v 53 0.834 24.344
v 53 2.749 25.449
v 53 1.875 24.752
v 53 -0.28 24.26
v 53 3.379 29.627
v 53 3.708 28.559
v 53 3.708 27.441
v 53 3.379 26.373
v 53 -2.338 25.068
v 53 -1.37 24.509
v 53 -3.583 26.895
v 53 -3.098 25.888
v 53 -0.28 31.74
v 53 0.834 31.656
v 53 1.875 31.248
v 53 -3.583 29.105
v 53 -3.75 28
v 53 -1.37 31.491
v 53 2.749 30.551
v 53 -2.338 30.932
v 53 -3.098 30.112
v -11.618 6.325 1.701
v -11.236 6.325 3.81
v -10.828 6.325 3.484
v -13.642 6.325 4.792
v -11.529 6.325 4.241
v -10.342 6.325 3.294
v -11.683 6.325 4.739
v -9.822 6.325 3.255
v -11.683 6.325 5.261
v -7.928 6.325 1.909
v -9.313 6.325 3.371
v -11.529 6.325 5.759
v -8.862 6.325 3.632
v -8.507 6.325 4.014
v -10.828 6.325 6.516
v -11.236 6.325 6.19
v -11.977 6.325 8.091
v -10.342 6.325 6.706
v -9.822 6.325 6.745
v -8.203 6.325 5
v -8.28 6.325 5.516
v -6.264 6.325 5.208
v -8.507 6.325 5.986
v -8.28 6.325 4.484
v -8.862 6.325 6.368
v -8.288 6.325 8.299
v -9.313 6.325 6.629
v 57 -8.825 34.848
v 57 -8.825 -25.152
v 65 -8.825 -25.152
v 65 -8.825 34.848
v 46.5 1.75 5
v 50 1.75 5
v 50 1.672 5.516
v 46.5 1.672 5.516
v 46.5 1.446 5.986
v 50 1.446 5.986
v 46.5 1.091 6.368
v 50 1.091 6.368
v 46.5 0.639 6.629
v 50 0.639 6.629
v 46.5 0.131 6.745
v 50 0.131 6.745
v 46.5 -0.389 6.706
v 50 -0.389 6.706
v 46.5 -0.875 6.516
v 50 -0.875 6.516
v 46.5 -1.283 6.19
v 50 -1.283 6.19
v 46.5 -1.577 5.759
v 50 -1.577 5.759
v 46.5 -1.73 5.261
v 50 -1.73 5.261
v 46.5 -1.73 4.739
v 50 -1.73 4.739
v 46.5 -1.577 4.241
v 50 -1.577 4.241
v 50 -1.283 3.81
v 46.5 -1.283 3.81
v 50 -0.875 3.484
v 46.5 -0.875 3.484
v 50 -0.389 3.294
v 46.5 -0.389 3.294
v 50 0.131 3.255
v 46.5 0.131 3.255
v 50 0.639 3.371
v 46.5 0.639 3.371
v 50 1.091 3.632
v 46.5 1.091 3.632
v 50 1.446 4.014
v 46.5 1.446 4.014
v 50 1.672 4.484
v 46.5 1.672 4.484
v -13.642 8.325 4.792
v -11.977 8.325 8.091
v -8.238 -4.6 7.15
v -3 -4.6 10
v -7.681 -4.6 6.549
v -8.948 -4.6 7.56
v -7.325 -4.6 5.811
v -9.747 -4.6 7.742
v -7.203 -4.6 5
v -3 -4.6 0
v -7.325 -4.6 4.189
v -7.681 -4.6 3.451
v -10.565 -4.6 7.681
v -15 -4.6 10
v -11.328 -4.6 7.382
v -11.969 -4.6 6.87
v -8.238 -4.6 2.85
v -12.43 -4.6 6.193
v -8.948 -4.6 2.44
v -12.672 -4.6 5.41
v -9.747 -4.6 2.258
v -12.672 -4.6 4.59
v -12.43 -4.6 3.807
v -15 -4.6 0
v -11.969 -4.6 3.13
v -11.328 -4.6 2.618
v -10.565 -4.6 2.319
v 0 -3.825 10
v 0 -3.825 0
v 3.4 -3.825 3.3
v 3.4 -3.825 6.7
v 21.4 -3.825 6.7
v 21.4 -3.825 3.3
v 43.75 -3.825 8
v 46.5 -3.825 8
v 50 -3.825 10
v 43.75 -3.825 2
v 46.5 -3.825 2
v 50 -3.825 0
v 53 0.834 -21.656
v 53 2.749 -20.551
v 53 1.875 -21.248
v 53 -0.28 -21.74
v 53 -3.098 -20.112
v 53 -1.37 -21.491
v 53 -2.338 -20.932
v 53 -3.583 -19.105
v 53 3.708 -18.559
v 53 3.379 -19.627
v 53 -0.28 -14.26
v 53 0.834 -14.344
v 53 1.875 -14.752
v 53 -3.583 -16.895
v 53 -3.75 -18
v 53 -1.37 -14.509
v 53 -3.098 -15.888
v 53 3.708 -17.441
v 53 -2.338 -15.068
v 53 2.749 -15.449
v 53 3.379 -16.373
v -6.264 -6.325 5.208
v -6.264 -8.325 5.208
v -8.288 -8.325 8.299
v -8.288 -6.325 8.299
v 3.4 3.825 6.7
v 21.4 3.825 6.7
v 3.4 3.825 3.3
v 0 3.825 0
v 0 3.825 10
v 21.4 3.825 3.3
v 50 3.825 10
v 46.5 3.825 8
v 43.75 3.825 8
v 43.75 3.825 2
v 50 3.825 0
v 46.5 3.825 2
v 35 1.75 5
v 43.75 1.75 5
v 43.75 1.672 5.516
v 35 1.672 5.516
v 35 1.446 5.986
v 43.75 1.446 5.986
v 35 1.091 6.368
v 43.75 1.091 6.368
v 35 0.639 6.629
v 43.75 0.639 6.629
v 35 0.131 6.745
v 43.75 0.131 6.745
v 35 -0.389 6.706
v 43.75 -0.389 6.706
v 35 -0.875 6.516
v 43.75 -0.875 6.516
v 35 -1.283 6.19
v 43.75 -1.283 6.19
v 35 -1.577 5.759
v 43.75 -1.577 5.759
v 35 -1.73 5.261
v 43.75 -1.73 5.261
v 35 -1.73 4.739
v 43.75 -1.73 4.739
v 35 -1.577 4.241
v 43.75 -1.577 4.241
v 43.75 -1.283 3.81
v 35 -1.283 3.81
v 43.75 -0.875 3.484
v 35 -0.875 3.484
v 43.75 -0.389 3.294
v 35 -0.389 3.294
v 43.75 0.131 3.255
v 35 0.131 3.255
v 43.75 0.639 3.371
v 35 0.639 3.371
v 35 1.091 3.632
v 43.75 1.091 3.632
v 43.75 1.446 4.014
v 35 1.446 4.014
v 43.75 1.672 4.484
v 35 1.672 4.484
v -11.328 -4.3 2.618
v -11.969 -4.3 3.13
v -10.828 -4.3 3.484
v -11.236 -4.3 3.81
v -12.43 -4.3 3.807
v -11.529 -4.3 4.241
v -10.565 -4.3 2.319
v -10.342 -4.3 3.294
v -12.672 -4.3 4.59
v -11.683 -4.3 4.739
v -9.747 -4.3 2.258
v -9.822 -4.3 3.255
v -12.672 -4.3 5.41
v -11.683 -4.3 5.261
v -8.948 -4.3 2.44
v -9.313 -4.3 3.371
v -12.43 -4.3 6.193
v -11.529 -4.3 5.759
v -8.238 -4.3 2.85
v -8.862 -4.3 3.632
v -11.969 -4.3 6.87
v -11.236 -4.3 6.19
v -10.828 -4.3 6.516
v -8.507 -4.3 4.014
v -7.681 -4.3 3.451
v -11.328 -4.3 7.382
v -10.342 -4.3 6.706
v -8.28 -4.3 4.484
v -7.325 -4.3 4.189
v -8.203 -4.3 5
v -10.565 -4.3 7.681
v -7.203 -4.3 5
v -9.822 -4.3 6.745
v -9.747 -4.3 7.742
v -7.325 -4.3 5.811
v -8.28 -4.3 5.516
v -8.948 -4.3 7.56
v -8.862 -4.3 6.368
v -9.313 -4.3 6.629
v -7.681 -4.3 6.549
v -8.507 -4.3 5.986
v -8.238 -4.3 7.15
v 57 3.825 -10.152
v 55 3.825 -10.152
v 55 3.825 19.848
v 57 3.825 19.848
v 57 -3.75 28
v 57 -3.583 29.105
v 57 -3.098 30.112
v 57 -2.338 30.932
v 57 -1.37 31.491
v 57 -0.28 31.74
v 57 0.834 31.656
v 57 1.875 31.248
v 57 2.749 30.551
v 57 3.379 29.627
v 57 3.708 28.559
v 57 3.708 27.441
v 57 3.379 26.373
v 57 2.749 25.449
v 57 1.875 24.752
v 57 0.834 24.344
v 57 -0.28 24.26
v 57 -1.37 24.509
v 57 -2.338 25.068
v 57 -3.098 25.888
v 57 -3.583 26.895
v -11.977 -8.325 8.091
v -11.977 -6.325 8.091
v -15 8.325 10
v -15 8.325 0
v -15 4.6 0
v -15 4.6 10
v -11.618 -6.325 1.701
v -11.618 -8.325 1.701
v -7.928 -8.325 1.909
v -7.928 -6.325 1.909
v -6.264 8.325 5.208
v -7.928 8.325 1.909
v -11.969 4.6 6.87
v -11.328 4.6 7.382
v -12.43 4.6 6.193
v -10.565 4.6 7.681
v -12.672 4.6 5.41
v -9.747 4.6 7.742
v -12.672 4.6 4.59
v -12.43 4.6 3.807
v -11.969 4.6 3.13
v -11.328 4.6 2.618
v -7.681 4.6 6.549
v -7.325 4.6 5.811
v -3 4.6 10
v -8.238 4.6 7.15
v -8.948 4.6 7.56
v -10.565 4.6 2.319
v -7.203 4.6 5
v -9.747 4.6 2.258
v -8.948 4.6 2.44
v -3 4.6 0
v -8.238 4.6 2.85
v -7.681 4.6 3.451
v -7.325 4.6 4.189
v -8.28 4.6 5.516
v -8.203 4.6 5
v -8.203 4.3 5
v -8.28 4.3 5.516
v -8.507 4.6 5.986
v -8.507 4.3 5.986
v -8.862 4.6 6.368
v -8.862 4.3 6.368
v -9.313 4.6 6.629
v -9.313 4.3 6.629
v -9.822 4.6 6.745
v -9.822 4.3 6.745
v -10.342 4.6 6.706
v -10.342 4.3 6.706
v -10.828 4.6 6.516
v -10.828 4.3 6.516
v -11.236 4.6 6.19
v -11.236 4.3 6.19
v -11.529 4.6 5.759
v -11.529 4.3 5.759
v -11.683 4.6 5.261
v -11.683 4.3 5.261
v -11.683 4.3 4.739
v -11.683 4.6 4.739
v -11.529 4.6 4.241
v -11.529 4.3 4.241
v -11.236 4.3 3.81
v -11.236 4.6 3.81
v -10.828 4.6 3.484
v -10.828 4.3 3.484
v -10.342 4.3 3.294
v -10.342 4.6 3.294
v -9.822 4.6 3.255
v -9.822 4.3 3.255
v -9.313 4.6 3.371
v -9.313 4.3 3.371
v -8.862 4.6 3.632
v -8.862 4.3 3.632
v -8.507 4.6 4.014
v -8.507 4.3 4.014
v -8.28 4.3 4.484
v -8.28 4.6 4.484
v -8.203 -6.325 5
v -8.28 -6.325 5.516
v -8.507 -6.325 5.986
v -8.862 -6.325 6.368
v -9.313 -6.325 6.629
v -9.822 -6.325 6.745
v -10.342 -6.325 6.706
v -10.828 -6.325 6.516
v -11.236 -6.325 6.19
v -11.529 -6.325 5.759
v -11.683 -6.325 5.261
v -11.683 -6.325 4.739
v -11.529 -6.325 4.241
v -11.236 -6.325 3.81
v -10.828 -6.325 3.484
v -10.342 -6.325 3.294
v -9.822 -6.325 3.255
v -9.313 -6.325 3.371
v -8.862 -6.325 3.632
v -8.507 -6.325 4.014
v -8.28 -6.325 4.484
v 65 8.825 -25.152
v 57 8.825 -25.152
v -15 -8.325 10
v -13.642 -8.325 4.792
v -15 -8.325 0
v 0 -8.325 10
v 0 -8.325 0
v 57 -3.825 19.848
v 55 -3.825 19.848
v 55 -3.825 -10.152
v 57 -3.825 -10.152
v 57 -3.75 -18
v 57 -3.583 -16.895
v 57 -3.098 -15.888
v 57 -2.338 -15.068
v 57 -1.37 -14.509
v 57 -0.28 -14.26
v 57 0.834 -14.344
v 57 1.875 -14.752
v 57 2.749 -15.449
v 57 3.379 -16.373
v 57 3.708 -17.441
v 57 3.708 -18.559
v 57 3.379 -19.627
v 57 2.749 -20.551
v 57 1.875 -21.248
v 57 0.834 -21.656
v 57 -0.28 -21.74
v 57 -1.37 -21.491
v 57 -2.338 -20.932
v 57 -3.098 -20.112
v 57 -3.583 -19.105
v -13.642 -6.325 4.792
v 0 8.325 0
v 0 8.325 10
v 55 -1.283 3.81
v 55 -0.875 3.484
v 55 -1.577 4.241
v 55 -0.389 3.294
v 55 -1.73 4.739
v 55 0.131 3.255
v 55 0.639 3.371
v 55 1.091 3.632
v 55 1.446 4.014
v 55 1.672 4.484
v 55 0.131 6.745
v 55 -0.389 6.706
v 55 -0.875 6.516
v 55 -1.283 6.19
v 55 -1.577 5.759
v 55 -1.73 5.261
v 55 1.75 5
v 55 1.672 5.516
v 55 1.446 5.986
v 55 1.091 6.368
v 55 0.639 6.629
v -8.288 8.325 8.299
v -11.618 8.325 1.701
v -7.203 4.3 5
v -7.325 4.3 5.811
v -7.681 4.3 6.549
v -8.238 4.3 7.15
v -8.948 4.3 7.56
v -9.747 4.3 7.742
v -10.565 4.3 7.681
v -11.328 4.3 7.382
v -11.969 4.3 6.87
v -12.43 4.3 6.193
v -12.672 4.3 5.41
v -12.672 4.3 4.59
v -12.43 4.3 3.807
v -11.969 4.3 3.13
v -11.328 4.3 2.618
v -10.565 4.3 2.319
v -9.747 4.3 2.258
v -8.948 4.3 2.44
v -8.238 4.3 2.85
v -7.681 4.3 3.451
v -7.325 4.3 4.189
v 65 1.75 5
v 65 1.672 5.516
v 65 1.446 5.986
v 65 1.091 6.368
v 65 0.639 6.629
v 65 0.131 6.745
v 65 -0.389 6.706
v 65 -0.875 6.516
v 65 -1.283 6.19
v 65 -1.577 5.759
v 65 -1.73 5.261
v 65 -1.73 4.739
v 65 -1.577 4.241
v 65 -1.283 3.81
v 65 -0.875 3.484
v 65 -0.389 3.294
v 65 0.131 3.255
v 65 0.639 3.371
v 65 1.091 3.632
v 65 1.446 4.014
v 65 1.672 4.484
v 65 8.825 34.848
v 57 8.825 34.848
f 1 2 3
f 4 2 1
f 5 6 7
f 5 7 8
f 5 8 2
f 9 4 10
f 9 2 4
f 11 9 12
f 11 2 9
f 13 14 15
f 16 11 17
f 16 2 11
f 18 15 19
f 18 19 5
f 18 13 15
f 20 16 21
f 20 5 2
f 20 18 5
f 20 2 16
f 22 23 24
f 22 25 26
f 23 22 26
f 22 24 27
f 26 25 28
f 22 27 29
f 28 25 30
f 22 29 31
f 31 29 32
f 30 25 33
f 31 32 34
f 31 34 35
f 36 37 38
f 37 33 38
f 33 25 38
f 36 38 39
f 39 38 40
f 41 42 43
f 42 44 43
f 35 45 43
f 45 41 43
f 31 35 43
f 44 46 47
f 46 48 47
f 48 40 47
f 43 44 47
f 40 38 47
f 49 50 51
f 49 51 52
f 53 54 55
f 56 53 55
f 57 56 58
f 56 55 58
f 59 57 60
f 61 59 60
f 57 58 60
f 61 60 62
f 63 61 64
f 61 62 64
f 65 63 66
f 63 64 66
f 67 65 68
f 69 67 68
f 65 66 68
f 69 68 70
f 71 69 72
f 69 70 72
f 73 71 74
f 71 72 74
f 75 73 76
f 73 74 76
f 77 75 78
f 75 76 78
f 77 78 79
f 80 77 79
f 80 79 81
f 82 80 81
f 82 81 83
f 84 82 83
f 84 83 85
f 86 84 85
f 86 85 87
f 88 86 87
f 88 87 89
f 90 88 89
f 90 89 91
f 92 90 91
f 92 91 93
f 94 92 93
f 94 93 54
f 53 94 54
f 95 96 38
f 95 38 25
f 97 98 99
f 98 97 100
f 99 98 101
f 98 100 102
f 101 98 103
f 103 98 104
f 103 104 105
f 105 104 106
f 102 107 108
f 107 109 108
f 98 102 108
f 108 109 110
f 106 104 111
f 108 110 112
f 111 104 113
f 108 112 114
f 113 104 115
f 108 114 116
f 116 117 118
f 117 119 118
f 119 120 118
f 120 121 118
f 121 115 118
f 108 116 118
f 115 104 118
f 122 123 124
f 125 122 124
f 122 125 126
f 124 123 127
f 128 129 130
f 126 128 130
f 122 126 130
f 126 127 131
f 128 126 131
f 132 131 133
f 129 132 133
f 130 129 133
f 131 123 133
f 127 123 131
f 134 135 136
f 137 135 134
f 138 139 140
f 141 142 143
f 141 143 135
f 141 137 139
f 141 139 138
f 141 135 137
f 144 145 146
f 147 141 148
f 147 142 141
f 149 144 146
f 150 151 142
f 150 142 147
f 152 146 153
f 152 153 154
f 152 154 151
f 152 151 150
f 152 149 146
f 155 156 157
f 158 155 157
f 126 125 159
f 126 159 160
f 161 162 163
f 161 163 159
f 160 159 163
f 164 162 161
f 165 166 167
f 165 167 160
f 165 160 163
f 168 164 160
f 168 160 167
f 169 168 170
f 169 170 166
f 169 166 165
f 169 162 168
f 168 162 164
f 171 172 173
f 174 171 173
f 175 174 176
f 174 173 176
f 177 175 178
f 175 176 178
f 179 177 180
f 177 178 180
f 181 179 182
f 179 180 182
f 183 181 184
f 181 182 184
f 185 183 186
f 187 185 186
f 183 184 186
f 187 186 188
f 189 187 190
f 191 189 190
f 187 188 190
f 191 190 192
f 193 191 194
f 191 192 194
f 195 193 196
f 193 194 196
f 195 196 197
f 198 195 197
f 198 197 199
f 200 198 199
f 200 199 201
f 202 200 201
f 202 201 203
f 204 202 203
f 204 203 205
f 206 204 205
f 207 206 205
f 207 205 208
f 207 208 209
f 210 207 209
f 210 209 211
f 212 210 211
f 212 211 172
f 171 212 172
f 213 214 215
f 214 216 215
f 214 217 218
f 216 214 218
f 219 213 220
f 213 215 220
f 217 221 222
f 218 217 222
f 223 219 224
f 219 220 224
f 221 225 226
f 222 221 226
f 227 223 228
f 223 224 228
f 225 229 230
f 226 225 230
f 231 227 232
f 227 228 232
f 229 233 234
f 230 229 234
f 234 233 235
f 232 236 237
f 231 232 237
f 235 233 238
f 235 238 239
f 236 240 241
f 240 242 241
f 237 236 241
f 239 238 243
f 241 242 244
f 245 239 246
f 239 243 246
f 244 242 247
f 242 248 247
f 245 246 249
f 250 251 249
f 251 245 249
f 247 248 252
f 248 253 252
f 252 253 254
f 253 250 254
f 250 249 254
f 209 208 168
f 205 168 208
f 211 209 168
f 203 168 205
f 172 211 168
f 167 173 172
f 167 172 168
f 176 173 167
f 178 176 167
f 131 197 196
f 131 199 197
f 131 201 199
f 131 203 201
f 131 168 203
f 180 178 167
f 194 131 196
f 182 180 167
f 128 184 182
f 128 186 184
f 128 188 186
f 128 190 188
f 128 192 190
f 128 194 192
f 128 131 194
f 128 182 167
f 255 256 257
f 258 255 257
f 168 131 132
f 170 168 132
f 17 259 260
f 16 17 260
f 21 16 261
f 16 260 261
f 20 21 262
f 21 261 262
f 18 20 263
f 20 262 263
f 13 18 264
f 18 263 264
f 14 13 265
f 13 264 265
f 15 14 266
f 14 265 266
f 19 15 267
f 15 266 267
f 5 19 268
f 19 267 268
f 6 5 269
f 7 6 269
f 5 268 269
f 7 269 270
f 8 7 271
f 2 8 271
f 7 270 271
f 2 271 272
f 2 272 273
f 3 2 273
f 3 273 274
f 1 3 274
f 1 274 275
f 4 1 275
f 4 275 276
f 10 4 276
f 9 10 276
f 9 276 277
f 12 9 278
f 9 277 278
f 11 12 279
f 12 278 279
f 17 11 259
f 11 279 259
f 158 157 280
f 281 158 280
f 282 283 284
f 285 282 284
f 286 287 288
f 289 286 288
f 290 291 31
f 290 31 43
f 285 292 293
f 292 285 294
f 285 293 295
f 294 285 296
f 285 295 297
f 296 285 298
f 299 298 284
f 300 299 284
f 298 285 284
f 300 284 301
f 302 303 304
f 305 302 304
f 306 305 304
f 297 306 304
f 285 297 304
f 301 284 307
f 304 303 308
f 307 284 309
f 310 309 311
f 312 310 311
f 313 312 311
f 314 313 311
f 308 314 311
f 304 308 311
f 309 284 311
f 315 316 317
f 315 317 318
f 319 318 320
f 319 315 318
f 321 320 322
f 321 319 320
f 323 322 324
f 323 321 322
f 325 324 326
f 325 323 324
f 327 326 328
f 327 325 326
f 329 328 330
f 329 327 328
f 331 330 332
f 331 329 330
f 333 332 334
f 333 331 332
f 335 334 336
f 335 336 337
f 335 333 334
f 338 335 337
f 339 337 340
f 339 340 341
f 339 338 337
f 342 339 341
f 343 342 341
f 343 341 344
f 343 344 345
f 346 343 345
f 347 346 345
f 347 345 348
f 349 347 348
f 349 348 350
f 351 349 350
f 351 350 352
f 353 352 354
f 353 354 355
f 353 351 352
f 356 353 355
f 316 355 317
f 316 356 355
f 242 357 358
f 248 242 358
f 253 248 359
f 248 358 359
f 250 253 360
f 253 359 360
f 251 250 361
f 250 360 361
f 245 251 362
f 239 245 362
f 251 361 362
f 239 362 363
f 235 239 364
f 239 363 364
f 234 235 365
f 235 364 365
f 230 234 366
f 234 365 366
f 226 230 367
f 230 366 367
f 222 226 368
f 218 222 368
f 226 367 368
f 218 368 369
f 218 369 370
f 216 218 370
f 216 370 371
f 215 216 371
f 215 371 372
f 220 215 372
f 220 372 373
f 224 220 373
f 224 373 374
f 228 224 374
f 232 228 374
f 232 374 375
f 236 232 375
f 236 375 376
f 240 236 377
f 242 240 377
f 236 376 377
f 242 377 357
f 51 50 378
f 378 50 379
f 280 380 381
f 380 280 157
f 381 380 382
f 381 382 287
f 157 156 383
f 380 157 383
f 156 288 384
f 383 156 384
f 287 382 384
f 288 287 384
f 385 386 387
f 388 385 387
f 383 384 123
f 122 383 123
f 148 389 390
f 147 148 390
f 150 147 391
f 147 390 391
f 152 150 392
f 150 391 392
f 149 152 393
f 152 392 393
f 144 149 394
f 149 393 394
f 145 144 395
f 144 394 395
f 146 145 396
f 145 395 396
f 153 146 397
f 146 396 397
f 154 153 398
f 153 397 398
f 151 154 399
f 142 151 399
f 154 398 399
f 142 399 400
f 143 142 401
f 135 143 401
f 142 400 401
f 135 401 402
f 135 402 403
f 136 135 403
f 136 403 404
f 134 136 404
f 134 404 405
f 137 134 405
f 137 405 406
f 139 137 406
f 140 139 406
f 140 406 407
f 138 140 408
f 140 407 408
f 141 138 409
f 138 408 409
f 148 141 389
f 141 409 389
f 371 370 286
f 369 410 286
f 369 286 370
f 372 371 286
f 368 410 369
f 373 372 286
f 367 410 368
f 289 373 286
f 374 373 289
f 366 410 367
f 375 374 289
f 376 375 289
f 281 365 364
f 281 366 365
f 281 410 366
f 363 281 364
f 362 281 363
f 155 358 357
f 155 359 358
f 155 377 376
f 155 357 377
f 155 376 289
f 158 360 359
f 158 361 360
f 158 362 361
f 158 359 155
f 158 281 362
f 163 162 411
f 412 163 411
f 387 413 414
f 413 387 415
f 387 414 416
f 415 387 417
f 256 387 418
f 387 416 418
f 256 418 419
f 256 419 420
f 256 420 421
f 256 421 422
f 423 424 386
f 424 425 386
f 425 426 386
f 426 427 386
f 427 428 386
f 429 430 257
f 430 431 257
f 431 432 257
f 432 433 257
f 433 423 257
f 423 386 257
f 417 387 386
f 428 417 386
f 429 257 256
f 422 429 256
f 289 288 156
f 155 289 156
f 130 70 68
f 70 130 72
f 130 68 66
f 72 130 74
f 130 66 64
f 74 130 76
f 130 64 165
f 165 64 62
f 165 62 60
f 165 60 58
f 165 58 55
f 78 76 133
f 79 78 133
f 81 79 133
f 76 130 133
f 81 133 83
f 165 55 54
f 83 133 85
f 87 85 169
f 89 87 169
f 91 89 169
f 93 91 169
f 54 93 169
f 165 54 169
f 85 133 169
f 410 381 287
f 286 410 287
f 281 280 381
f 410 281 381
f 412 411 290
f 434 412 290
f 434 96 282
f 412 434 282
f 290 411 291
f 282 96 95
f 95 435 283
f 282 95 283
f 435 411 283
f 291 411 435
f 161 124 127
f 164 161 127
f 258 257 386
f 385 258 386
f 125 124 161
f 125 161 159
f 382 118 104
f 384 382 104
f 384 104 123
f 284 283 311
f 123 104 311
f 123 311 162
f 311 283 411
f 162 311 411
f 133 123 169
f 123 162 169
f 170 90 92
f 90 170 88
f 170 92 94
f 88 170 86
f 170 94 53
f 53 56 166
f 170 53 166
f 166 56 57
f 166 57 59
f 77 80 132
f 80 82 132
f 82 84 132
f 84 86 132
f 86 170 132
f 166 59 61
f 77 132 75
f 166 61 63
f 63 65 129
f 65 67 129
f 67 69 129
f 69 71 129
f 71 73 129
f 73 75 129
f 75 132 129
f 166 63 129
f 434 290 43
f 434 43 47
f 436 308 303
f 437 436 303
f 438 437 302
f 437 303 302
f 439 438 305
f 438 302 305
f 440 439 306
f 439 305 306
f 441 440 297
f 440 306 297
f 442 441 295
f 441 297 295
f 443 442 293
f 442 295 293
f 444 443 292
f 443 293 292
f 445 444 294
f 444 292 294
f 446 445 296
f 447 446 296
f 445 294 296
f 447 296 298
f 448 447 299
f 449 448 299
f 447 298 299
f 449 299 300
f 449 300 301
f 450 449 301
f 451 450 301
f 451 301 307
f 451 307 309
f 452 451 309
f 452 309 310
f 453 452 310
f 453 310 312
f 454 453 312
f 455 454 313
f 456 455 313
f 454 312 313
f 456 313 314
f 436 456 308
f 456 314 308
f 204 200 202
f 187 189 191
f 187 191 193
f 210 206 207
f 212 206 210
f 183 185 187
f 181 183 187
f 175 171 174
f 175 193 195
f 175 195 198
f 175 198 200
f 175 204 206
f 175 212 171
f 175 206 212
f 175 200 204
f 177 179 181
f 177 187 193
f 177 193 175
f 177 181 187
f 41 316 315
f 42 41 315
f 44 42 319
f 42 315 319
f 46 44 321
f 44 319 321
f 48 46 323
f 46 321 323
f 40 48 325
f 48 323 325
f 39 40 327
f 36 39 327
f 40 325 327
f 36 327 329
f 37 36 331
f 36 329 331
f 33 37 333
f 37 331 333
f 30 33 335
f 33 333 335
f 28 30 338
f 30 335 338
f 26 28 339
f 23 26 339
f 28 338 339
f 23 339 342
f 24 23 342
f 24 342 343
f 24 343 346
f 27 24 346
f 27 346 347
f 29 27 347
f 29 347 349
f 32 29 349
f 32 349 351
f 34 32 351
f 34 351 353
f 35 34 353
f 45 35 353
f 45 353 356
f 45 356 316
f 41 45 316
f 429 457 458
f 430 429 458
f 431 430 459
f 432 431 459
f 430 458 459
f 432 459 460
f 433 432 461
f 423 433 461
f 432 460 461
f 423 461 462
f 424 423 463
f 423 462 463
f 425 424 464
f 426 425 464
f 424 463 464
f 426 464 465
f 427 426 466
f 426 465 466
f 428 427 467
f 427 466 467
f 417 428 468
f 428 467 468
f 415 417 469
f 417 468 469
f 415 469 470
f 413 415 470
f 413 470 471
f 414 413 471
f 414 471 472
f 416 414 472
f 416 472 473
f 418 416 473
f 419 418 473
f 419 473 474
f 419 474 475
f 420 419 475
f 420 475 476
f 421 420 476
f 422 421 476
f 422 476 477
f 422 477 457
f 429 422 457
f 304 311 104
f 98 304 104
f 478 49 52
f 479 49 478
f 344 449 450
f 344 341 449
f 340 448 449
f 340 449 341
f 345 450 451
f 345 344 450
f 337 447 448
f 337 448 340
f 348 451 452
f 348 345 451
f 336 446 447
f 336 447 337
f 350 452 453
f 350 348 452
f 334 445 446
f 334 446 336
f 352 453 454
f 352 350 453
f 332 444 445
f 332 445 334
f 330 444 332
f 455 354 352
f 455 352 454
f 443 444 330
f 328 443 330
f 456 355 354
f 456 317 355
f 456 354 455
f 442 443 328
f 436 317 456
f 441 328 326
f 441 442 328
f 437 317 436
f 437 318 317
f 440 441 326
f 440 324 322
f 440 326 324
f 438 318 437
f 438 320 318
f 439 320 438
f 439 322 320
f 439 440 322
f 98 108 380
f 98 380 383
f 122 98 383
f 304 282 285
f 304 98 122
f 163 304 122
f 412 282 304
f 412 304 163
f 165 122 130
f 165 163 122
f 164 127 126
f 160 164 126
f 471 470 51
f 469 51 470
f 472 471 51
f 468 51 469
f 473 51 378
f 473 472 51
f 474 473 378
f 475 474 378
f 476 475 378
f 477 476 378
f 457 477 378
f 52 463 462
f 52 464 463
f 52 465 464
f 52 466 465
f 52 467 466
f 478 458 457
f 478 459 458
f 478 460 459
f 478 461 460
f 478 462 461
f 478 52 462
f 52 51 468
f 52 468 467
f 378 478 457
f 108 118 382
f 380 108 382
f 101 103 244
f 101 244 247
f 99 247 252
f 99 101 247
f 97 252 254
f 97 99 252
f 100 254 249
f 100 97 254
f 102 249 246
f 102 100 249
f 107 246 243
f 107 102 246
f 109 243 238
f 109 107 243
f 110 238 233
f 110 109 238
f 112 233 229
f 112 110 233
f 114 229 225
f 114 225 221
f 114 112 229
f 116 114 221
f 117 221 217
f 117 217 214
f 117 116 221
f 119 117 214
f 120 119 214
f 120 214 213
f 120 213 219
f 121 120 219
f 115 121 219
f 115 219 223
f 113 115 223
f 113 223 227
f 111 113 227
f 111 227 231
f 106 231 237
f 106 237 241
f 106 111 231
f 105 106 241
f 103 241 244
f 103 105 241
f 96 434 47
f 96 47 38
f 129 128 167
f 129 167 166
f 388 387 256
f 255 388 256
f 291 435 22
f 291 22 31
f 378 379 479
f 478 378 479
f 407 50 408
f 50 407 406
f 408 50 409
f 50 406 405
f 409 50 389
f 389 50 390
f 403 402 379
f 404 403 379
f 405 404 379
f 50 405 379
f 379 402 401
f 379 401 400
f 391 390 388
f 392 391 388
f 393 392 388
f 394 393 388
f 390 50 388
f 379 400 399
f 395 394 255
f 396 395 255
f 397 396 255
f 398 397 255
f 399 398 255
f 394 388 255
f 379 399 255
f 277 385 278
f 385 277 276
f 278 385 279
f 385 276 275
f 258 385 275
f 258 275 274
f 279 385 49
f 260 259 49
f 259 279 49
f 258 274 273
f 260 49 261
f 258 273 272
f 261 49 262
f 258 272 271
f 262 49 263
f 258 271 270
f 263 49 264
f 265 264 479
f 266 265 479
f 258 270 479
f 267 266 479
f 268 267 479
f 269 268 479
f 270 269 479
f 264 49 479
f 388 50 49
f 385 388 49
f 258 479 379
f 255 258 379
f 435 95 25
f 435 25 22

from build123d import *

# Parameters (mm, degrees)
F0_W      = 50
F0_H      = 3.825
F1_DEPTH  = 10
F2_R      = 1.75
F3_DEPTH  = 16.651
F4_W      = 18
F4_H      = 3.4
F4_W_2    = 2.75
F4_H_2    = 6
F5_DEPTH  = 12.151
F6_R      = 1.75
F7_DEPTH  = 15
F10_DEPTH = 2
F11_W     = 17.65
F11_H     = 60
F12_DEPTH = 8
F13_R     = 1.75
F14_DEPTH = 80.001
F15_R     = 2.75
F15_R_2   = 1.75
F16_DEPTH = 0.3
F17_R     = 1.75
F18_DEPTH = 2
F19_R     = 3.75
F20_DEPTH = 4


# Not quite as in the source:
# - a pattern or mirror of a feature is missing from the dataset's text; its kind, count and spacing are read off the source's solid


with BuildPart() as f1:
    # F0 (on Top) → F1 (new body)
    with BuildSketch(Plane.XY):
        Polygon((0, -3.825), (0, 0), (-3, 0), (-3, -4.6), (-15, -4.6), (-15, -8.325), (0, -8.325), align=None)
        Polygon((-3, 0), (0, 0), (0, 3.825), (0, 8.325), (-15, 8.325), (-15, 4.6), (-3, 4.6), align=None)
        with Locations((25, 1.9125)):
            Rectangle(F0_W, F0_H)
        with Locations((25, -1.9125)):
            Rectangle(F0_W, F0_H)
    extrude(amount=F1_DEPTH)

    # F2 (on face) → F3 (cut, through all)
    with BuildSketch(Plane.XZ.offset(8.325)):
        with Locations((-9.9527407438, 5)):
            Circle(F2_R)
    extrude(amount=-F3_DEPTH, mode=Mode.SUBTRACT)

    # F4 (on face) → F5 (cut, through all)
    with BuildSketch(Plane.XZ.offset(3.825)):
        with Locations((12.4002694301, 5)):
            Rectangle(F4_W, F4_H)
        with Locations((45.125, 5)):
            Rectangle(F4_W_2, F4_H_2)
    extrude(amount=-F5_DEPTH, mode=Mode.SUBTRACT)

    # F6 (on face) → F7 (cut)
    with BuildSketch(Plane.YZ.offset(50)):
        with Locations((0, 5)):
            Circle(F6_R)
    extrude(amount=-F7_DEPTH, mode=Mode.SUBTRACT)

    # F15 (on face) → F16 (join)
    with BuildSketch(Plane.XZ.offset(-4.6)):
        with Locations((-9.9527407438, 5)):
            Circle(F15_R)
        with Locations((-9.9527407438, 5)):
            Circle(F15_R_2, mode=Mode.SUBTRACT)
    f16 = extrude(amount=F16_DEPTH)

    # F16_copies: F16 across plane
    add(f16.mirror(Plane(origin=(0, 0, 0), x_dir=(0, 0, -1), z_dir=(0, -1, 0))))

    # F17 (on face) → F18 (cut)
    with BuildSketch(Plane.XZ.offset(8.325)):
        Polygon((-7.9284293953, 1.9088033227), (-6.2635302189, 5.2075067143), (-8.2878415673, 8.2987033916), (-11.9770520922, 8.0911966773), (-13.6419512686, 4.7924932857), (-11.6176399202, 1.7012966084), align=None)
        with Locations((-9.9527407438, 5)):
            Circle(F17_R, mode=Mode.SUBTRACT)
    f18 = extrude(amount=-F18_DEPTH, mode=Mode.SUBTRACT)

    # F18_copies: F18 across plane
    add(f18.mirror(Plane.ZX), mode=Mode.SUBTRACT)


with BuildPart() as f10:
    # F9 (on offset) → F10 (new body)
    with BuildSketch(Plane.YZ.offset(55)):
        Polygon((3.825, 0), (3.825, 10), (3.825, 19.8484882712), (-3.825, 19.8484882712), (-3.825, 10), (-3.825, 0), (-3.825, -10.1515117288), (3.825, -10.1515117288), align=None)
    extrude(amount=F10_DEPTH)

    # F11 (on face) → F12 (join)
    with BuildSketch(Plane.YZ.offset(57)):
        with Locations((0, 4.8484882712)):
            Rectangle(F11_W, F11_H)
    extrude(amount=F12_DEPTH)

    # F13 (on face) → F14 (cut, through all)
    with BuildSketch(Plane.YZ.offset(65)):
        with Locations((0, 5)):
            Circle(F13_R)
    extrude(amount=-F14_DEPTH, mode=Mode.SUBTRACT)

    # F19 (on face) → F20 (join)
    with BuildSketch(Plane(origin=(57, 0, 0), x_dir=(0, -1, 0), z_dir=(-1, 0, 0))):
        with Locations((0, 28)):
            Circle(F19_R)
        with Locations((0, -18)):
            Circle(F19_R)
    extrude(amount=F20_DEPTH)


solid = Compound([f1.part, f10.part])
